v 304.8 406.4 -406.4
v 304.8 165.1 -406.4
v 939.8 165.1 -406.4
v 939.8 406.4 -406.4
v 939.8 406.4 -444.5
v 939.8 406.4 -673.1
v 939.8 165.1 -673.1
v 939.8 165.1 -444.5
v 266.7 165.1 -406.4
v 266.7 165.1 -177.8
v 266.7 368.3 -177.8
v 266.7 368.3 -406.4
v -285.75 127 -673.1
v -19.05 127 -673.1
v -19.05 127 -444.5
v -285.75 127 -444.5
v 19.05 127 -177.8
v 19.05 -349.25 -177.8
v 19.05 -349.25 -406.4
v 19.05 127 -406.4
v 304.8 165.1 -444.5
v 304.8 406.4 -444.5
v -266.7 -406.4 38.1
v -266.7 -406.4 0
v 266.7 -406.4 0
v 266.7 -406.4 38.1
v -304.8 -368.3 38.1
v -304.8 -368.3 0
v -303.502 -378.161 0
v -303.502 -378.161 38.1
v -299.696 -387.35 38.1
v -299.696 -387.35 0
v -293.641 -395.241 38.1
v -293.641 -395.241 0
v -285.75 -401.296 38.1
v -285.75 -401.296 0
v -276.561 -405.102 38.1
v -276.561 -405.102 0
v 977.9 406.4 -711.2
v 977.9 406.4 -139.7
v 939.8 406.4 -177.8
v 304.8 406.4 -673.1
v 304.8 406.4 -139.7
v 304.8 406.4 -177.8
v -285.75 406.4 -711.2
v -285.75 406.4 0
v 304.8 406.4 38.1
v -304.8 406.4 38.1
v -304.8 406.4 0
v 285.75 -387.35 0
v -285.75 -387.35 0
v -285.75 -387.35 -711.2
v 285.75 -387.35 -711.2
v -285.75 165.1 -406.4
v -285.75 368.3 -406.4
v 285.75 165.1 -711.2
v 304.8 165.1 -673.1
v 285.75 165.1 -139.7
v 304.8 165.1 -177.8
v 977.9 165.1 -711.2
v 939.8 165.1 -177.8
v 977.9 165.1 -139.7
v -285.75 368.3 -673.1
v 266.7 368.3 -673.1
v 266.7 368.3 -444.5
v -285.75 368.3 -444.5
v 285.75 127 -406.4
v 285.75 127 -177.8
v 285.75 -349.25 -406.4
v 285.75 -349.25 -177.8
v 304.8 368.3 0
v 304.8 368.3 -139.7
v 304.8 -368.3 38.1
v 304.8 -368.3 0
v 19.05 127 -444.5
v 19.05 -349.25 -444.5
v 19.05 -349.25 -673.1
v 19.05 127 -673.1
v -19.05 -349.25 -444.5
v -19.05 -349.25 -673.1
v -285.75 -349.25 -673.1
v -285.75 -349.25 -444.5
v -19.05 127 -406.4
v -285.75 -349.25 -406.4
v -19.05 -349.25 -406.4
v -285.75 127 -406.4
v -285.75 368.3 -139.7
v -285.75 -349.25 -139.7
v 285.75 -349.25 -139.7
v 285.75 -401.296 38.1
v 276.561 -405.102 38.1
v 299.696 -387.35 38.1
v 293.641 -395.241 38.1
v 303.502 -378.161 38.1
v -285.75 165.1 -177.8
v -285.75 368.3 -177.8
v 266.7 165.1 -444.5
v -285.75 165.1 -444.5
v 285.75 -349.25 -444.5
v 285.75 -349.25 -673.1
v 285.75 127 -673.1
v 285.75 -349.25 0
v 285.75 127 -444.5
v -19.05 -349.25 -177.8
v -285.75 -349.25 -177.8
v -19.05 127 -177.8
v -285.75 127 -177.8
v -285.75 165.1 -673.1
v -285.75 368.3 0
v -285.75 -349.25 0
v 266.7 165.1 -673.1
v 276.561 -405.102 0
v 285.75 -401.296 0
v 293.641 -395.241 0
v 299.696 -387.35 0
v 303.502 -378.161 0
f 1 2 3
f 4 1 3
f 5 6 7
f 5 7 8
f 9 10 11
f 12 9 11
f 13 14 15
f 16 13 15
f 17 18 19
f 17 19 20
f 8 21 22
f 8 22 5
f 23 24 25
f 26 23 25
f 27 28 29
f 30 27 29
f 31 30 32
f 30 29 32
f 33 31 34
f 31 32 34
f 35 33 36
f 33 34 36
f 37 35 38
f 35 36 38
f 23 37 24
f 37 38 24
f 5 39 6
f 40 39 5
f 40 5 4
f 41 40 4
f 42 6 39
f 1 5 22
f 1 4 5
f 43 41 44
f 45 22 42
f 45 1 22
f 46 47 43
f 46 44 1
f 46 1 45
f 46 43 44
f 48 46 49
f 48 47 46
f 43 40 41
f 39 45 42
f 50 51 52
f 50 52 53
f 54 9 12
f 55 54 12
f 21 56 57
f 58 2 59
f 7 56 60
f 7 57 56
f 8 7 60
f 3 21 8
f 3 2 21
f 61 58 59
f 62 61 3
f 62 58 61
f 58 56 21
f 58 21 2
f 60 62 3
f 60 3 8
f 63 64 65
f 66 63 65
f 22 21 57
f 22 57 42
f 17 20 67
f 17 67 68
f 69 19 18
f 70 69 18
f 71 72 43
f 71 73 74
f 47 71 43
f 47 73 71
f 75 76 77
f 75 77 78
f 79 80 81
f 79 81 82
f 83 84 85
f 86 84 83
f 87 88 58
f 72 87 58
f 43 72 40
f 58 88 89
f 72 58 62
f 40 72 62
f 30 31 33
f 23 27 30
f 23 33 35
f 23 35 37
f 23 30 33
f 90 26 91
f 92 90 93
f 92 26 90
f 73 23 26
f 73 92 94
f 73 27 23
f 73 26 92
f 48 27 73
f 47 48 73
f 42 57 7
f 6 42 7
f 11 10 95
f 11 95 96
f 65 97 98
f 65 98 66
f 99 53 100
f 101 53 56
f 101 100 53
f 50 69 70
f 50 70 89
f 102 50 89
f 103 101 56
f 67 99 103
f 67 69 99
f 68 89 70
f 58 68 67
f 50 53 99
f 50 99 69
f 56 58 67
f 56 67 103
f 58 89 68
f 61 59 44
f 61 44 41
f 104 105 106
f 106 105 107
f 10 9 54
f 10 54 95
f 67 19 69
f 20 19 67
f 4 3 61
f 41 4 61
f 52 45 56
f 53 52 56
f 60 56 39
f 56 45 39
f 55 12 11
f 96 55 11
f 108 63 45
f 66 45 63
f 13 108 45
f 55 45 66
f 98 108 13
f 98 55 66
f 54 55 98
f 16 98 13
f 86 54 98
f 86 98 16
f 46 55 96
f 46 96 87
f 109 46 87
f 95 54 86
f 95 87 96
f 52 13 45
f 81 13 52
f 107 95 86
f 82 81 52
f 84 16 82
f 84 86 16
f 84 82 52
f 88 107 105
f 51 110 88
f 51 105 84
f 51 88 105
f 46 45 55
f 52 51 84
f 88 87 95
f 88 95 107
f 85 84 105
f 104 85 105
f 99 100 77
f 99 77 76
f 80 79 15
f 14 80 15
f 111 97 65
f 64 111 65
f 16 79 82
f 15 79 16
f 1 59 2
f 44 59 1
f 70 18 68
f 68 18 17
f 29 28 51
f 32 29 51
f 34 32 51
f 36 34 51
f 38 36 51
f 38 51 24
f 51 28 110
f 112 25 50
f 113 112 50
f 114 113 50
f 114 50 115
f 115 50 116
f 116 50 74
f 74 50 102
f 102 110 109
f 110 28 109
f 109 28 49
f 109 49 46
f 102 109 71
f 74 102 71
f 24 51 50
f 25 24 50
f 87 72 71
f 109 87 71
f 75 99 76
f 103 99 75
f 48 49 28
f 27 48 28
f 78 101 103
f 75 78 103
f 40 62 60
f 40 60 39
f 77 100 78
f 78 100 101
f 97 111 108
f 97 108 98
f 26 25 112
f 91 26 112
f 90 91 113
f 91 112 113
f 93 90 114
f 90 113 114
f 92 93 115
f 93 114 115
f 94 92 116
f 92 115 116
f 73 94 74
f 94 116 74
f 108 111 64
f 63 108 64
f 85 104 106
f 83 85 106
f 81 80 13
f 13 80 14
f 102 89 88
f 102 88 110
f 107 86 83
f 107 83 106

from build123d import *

# Parameters (mm, degrees)
F1_DEPTH       = 38.1
F2_DEPTH       = 711.2
F0_W           = 654.05
F0_H           = 222.25
F3_DEPTH       = 711.2
F4_W           = 673.1
F4_H           = 139.7
F4_W_2         = 635
F4_H_2         = 228.6
F5_DEPTH       = 406.401
F0_W_2         = 19.05
F0_H_2         = 19.05
F6_DEPTH       = 38.1
F7_DEPTH       = 711.2
F8_W           = 476.25
F8_H           = 139.7
F8_W_2         = 241.3
F8_H_2         = 228.6
F9_DEPTH       = 406.4
F10_W          = 203.2
F10_H          = 228.6
F11_DEPTH      = 609.6
F11_DEPTH_BACK = 266.7
F13_START      = -152.4
F12_W          = 38.1
F12_H          = 552.45
F13_DEPTH      = 558.8


with BuildPart() as f1:
    # F0 (on Top) → F1 (new body)
    with BuildSketch(Plane.XY):
        Polygon((285.75, 184.15), (304.8, 184.15), (304.8, 406.4), (-285.75, 406.4), (-285.75, -387.35), (285.75, -387.35), (285.75, 165.1), align=None)
        with BuildLine():
            Line((-266.7, -406.4), (266.7, -406.4))
            ThreePointArc((266.7, -406.4), (293.6407683632, -395.2407683632), (304.8, -368.3))
            Line((304.8, -368.3), (304.8, 165.1))
            Line((304.8, 165.1), (285.75, 165.1))
            Line((285.75, 165.1), (285.75, -387.35))
            Line((285.75, -387.35), (-285.75, -387.35))
            Line((-285.75, -387.35), (-285.75, 406.4))
            Line((-285.75, 406.4), (-304.8, 406.4))
            Line((-304.8, 406.4), (-304.8, -368.3))
            ThreePointArc((-304.8, -368.3), (-293.6407683632, -395.2407683632), (-266.7, -406.4))
        make_face()
    extrude(amount=F1_DEPTH)



with BuildPart() as f2:
    # F0 (on Top) → F2 (new body)
    with BuildSketch(Plane.XY):
        Polygon((285.75, 184.15), (304.8, 184.15), (304.8, 406.4), (-285.75, 406.4), (-285.75, -387.35), (285.75, -387.35), (285.75, 165.1), align=None)
    extrude(amount=-F2_DEPTH)


with BuildPart() as f3:
    # F0 (on Top) → F3 (new body)
    with BuildSketch(Plane.XY):
        with Locations((631.825, 295.275)):
            Rectangle(F0_W, F0_H)
        Polygon((304.8, 184.15), (304.8, 165.1), (305.019557476, 165.1), (977.9, 165.1), (977.9, 406.4), (958.85, 406.4), (958.85, 184.15), align=None)
    extrude(amount=-F3_DEPTH)

    # F4 (on Front) → F5 (cut, through all)
    with BuildSketch(Plane.XZ):
        with Locations((641.35, -69.85)):
            Rectangle(F4_W, F4_H)
        with Locations((622.3, -292.1)):
            Rectangle(F4_W_2, F4_H_2)
        with Locations((622.3, -558.8)):
            Rectangle(F4_W_2, F4_H_2)
    extrude(amount=-F5_DEPTH, mode=Mode.SUBTRACT)


with BuildPart() as f1_1:
    add(f1.part)

    add(f2.part)  # F6 merges F2
    # F0 (on Top) → F6 (join)
    with BuildSketch(Plane.XY):
        with Locations((295.275, 174.625)):
            Rectangle(F0_W_2, F0_H_2)
    extrude(amount=F6_DEPTH)


    add(f3.part)  # F7 merges F3
    # F0 (on Top) → F7 (join)
    with BuildSketch(Plane.XY):
        with Locations((295.275, 174.625)):
            Rectangle(F0_W_2, F0_H_2)
    extrude(amount=-F7_DEPTH)

    # F8 (on Right) → F9 (cut, symmetric)
    with BuildSketch(Plane.YZ):
        with Locations((-111.125, -69.85)):
            Rectangle(F8_W, F8_H)
        with Locations((247.65, -69.85)):
            Rectangle(F8_W_2, F8_H)
        with Locations((-111.125, -292.1)):
            Rectangle(F8_W, F8_H_2)
        with Locations((-111.125, -558.8)):
            Rectangle(F8_W, F8_H_2)
    extrude(amount=F9_DEPTH, both=True, mode=Mode.SUBTRACT)

    # F10 (on Right) → F11 (cut, two sides)
    with BuildSketch(Plane.YZ) as f11_sk:
        with Locations((266.7, -292.1)):
            Rectangle(F10_W, F10_H)
        with Locations((266.7, -558.8)):
            Rectangle(F10_W, F10_H)
    extrude(amount=-F11_DEPTH, mode=Mode.SUBTRACT)
    extrude(f11_sk.sketch, amount=F11_DEPTH_BACK, mode=Mode.SUBTRACT)

    # F12 (on Top) → F13 (join)
    with BuildSketch(Plane.XY.offset(F13_START)):
        with Locations((0, -111.125)):
            Rectangle(F12_W, F12_H)
    extrude(amount=-F13_DEPTH)


solid = f1_1.part
